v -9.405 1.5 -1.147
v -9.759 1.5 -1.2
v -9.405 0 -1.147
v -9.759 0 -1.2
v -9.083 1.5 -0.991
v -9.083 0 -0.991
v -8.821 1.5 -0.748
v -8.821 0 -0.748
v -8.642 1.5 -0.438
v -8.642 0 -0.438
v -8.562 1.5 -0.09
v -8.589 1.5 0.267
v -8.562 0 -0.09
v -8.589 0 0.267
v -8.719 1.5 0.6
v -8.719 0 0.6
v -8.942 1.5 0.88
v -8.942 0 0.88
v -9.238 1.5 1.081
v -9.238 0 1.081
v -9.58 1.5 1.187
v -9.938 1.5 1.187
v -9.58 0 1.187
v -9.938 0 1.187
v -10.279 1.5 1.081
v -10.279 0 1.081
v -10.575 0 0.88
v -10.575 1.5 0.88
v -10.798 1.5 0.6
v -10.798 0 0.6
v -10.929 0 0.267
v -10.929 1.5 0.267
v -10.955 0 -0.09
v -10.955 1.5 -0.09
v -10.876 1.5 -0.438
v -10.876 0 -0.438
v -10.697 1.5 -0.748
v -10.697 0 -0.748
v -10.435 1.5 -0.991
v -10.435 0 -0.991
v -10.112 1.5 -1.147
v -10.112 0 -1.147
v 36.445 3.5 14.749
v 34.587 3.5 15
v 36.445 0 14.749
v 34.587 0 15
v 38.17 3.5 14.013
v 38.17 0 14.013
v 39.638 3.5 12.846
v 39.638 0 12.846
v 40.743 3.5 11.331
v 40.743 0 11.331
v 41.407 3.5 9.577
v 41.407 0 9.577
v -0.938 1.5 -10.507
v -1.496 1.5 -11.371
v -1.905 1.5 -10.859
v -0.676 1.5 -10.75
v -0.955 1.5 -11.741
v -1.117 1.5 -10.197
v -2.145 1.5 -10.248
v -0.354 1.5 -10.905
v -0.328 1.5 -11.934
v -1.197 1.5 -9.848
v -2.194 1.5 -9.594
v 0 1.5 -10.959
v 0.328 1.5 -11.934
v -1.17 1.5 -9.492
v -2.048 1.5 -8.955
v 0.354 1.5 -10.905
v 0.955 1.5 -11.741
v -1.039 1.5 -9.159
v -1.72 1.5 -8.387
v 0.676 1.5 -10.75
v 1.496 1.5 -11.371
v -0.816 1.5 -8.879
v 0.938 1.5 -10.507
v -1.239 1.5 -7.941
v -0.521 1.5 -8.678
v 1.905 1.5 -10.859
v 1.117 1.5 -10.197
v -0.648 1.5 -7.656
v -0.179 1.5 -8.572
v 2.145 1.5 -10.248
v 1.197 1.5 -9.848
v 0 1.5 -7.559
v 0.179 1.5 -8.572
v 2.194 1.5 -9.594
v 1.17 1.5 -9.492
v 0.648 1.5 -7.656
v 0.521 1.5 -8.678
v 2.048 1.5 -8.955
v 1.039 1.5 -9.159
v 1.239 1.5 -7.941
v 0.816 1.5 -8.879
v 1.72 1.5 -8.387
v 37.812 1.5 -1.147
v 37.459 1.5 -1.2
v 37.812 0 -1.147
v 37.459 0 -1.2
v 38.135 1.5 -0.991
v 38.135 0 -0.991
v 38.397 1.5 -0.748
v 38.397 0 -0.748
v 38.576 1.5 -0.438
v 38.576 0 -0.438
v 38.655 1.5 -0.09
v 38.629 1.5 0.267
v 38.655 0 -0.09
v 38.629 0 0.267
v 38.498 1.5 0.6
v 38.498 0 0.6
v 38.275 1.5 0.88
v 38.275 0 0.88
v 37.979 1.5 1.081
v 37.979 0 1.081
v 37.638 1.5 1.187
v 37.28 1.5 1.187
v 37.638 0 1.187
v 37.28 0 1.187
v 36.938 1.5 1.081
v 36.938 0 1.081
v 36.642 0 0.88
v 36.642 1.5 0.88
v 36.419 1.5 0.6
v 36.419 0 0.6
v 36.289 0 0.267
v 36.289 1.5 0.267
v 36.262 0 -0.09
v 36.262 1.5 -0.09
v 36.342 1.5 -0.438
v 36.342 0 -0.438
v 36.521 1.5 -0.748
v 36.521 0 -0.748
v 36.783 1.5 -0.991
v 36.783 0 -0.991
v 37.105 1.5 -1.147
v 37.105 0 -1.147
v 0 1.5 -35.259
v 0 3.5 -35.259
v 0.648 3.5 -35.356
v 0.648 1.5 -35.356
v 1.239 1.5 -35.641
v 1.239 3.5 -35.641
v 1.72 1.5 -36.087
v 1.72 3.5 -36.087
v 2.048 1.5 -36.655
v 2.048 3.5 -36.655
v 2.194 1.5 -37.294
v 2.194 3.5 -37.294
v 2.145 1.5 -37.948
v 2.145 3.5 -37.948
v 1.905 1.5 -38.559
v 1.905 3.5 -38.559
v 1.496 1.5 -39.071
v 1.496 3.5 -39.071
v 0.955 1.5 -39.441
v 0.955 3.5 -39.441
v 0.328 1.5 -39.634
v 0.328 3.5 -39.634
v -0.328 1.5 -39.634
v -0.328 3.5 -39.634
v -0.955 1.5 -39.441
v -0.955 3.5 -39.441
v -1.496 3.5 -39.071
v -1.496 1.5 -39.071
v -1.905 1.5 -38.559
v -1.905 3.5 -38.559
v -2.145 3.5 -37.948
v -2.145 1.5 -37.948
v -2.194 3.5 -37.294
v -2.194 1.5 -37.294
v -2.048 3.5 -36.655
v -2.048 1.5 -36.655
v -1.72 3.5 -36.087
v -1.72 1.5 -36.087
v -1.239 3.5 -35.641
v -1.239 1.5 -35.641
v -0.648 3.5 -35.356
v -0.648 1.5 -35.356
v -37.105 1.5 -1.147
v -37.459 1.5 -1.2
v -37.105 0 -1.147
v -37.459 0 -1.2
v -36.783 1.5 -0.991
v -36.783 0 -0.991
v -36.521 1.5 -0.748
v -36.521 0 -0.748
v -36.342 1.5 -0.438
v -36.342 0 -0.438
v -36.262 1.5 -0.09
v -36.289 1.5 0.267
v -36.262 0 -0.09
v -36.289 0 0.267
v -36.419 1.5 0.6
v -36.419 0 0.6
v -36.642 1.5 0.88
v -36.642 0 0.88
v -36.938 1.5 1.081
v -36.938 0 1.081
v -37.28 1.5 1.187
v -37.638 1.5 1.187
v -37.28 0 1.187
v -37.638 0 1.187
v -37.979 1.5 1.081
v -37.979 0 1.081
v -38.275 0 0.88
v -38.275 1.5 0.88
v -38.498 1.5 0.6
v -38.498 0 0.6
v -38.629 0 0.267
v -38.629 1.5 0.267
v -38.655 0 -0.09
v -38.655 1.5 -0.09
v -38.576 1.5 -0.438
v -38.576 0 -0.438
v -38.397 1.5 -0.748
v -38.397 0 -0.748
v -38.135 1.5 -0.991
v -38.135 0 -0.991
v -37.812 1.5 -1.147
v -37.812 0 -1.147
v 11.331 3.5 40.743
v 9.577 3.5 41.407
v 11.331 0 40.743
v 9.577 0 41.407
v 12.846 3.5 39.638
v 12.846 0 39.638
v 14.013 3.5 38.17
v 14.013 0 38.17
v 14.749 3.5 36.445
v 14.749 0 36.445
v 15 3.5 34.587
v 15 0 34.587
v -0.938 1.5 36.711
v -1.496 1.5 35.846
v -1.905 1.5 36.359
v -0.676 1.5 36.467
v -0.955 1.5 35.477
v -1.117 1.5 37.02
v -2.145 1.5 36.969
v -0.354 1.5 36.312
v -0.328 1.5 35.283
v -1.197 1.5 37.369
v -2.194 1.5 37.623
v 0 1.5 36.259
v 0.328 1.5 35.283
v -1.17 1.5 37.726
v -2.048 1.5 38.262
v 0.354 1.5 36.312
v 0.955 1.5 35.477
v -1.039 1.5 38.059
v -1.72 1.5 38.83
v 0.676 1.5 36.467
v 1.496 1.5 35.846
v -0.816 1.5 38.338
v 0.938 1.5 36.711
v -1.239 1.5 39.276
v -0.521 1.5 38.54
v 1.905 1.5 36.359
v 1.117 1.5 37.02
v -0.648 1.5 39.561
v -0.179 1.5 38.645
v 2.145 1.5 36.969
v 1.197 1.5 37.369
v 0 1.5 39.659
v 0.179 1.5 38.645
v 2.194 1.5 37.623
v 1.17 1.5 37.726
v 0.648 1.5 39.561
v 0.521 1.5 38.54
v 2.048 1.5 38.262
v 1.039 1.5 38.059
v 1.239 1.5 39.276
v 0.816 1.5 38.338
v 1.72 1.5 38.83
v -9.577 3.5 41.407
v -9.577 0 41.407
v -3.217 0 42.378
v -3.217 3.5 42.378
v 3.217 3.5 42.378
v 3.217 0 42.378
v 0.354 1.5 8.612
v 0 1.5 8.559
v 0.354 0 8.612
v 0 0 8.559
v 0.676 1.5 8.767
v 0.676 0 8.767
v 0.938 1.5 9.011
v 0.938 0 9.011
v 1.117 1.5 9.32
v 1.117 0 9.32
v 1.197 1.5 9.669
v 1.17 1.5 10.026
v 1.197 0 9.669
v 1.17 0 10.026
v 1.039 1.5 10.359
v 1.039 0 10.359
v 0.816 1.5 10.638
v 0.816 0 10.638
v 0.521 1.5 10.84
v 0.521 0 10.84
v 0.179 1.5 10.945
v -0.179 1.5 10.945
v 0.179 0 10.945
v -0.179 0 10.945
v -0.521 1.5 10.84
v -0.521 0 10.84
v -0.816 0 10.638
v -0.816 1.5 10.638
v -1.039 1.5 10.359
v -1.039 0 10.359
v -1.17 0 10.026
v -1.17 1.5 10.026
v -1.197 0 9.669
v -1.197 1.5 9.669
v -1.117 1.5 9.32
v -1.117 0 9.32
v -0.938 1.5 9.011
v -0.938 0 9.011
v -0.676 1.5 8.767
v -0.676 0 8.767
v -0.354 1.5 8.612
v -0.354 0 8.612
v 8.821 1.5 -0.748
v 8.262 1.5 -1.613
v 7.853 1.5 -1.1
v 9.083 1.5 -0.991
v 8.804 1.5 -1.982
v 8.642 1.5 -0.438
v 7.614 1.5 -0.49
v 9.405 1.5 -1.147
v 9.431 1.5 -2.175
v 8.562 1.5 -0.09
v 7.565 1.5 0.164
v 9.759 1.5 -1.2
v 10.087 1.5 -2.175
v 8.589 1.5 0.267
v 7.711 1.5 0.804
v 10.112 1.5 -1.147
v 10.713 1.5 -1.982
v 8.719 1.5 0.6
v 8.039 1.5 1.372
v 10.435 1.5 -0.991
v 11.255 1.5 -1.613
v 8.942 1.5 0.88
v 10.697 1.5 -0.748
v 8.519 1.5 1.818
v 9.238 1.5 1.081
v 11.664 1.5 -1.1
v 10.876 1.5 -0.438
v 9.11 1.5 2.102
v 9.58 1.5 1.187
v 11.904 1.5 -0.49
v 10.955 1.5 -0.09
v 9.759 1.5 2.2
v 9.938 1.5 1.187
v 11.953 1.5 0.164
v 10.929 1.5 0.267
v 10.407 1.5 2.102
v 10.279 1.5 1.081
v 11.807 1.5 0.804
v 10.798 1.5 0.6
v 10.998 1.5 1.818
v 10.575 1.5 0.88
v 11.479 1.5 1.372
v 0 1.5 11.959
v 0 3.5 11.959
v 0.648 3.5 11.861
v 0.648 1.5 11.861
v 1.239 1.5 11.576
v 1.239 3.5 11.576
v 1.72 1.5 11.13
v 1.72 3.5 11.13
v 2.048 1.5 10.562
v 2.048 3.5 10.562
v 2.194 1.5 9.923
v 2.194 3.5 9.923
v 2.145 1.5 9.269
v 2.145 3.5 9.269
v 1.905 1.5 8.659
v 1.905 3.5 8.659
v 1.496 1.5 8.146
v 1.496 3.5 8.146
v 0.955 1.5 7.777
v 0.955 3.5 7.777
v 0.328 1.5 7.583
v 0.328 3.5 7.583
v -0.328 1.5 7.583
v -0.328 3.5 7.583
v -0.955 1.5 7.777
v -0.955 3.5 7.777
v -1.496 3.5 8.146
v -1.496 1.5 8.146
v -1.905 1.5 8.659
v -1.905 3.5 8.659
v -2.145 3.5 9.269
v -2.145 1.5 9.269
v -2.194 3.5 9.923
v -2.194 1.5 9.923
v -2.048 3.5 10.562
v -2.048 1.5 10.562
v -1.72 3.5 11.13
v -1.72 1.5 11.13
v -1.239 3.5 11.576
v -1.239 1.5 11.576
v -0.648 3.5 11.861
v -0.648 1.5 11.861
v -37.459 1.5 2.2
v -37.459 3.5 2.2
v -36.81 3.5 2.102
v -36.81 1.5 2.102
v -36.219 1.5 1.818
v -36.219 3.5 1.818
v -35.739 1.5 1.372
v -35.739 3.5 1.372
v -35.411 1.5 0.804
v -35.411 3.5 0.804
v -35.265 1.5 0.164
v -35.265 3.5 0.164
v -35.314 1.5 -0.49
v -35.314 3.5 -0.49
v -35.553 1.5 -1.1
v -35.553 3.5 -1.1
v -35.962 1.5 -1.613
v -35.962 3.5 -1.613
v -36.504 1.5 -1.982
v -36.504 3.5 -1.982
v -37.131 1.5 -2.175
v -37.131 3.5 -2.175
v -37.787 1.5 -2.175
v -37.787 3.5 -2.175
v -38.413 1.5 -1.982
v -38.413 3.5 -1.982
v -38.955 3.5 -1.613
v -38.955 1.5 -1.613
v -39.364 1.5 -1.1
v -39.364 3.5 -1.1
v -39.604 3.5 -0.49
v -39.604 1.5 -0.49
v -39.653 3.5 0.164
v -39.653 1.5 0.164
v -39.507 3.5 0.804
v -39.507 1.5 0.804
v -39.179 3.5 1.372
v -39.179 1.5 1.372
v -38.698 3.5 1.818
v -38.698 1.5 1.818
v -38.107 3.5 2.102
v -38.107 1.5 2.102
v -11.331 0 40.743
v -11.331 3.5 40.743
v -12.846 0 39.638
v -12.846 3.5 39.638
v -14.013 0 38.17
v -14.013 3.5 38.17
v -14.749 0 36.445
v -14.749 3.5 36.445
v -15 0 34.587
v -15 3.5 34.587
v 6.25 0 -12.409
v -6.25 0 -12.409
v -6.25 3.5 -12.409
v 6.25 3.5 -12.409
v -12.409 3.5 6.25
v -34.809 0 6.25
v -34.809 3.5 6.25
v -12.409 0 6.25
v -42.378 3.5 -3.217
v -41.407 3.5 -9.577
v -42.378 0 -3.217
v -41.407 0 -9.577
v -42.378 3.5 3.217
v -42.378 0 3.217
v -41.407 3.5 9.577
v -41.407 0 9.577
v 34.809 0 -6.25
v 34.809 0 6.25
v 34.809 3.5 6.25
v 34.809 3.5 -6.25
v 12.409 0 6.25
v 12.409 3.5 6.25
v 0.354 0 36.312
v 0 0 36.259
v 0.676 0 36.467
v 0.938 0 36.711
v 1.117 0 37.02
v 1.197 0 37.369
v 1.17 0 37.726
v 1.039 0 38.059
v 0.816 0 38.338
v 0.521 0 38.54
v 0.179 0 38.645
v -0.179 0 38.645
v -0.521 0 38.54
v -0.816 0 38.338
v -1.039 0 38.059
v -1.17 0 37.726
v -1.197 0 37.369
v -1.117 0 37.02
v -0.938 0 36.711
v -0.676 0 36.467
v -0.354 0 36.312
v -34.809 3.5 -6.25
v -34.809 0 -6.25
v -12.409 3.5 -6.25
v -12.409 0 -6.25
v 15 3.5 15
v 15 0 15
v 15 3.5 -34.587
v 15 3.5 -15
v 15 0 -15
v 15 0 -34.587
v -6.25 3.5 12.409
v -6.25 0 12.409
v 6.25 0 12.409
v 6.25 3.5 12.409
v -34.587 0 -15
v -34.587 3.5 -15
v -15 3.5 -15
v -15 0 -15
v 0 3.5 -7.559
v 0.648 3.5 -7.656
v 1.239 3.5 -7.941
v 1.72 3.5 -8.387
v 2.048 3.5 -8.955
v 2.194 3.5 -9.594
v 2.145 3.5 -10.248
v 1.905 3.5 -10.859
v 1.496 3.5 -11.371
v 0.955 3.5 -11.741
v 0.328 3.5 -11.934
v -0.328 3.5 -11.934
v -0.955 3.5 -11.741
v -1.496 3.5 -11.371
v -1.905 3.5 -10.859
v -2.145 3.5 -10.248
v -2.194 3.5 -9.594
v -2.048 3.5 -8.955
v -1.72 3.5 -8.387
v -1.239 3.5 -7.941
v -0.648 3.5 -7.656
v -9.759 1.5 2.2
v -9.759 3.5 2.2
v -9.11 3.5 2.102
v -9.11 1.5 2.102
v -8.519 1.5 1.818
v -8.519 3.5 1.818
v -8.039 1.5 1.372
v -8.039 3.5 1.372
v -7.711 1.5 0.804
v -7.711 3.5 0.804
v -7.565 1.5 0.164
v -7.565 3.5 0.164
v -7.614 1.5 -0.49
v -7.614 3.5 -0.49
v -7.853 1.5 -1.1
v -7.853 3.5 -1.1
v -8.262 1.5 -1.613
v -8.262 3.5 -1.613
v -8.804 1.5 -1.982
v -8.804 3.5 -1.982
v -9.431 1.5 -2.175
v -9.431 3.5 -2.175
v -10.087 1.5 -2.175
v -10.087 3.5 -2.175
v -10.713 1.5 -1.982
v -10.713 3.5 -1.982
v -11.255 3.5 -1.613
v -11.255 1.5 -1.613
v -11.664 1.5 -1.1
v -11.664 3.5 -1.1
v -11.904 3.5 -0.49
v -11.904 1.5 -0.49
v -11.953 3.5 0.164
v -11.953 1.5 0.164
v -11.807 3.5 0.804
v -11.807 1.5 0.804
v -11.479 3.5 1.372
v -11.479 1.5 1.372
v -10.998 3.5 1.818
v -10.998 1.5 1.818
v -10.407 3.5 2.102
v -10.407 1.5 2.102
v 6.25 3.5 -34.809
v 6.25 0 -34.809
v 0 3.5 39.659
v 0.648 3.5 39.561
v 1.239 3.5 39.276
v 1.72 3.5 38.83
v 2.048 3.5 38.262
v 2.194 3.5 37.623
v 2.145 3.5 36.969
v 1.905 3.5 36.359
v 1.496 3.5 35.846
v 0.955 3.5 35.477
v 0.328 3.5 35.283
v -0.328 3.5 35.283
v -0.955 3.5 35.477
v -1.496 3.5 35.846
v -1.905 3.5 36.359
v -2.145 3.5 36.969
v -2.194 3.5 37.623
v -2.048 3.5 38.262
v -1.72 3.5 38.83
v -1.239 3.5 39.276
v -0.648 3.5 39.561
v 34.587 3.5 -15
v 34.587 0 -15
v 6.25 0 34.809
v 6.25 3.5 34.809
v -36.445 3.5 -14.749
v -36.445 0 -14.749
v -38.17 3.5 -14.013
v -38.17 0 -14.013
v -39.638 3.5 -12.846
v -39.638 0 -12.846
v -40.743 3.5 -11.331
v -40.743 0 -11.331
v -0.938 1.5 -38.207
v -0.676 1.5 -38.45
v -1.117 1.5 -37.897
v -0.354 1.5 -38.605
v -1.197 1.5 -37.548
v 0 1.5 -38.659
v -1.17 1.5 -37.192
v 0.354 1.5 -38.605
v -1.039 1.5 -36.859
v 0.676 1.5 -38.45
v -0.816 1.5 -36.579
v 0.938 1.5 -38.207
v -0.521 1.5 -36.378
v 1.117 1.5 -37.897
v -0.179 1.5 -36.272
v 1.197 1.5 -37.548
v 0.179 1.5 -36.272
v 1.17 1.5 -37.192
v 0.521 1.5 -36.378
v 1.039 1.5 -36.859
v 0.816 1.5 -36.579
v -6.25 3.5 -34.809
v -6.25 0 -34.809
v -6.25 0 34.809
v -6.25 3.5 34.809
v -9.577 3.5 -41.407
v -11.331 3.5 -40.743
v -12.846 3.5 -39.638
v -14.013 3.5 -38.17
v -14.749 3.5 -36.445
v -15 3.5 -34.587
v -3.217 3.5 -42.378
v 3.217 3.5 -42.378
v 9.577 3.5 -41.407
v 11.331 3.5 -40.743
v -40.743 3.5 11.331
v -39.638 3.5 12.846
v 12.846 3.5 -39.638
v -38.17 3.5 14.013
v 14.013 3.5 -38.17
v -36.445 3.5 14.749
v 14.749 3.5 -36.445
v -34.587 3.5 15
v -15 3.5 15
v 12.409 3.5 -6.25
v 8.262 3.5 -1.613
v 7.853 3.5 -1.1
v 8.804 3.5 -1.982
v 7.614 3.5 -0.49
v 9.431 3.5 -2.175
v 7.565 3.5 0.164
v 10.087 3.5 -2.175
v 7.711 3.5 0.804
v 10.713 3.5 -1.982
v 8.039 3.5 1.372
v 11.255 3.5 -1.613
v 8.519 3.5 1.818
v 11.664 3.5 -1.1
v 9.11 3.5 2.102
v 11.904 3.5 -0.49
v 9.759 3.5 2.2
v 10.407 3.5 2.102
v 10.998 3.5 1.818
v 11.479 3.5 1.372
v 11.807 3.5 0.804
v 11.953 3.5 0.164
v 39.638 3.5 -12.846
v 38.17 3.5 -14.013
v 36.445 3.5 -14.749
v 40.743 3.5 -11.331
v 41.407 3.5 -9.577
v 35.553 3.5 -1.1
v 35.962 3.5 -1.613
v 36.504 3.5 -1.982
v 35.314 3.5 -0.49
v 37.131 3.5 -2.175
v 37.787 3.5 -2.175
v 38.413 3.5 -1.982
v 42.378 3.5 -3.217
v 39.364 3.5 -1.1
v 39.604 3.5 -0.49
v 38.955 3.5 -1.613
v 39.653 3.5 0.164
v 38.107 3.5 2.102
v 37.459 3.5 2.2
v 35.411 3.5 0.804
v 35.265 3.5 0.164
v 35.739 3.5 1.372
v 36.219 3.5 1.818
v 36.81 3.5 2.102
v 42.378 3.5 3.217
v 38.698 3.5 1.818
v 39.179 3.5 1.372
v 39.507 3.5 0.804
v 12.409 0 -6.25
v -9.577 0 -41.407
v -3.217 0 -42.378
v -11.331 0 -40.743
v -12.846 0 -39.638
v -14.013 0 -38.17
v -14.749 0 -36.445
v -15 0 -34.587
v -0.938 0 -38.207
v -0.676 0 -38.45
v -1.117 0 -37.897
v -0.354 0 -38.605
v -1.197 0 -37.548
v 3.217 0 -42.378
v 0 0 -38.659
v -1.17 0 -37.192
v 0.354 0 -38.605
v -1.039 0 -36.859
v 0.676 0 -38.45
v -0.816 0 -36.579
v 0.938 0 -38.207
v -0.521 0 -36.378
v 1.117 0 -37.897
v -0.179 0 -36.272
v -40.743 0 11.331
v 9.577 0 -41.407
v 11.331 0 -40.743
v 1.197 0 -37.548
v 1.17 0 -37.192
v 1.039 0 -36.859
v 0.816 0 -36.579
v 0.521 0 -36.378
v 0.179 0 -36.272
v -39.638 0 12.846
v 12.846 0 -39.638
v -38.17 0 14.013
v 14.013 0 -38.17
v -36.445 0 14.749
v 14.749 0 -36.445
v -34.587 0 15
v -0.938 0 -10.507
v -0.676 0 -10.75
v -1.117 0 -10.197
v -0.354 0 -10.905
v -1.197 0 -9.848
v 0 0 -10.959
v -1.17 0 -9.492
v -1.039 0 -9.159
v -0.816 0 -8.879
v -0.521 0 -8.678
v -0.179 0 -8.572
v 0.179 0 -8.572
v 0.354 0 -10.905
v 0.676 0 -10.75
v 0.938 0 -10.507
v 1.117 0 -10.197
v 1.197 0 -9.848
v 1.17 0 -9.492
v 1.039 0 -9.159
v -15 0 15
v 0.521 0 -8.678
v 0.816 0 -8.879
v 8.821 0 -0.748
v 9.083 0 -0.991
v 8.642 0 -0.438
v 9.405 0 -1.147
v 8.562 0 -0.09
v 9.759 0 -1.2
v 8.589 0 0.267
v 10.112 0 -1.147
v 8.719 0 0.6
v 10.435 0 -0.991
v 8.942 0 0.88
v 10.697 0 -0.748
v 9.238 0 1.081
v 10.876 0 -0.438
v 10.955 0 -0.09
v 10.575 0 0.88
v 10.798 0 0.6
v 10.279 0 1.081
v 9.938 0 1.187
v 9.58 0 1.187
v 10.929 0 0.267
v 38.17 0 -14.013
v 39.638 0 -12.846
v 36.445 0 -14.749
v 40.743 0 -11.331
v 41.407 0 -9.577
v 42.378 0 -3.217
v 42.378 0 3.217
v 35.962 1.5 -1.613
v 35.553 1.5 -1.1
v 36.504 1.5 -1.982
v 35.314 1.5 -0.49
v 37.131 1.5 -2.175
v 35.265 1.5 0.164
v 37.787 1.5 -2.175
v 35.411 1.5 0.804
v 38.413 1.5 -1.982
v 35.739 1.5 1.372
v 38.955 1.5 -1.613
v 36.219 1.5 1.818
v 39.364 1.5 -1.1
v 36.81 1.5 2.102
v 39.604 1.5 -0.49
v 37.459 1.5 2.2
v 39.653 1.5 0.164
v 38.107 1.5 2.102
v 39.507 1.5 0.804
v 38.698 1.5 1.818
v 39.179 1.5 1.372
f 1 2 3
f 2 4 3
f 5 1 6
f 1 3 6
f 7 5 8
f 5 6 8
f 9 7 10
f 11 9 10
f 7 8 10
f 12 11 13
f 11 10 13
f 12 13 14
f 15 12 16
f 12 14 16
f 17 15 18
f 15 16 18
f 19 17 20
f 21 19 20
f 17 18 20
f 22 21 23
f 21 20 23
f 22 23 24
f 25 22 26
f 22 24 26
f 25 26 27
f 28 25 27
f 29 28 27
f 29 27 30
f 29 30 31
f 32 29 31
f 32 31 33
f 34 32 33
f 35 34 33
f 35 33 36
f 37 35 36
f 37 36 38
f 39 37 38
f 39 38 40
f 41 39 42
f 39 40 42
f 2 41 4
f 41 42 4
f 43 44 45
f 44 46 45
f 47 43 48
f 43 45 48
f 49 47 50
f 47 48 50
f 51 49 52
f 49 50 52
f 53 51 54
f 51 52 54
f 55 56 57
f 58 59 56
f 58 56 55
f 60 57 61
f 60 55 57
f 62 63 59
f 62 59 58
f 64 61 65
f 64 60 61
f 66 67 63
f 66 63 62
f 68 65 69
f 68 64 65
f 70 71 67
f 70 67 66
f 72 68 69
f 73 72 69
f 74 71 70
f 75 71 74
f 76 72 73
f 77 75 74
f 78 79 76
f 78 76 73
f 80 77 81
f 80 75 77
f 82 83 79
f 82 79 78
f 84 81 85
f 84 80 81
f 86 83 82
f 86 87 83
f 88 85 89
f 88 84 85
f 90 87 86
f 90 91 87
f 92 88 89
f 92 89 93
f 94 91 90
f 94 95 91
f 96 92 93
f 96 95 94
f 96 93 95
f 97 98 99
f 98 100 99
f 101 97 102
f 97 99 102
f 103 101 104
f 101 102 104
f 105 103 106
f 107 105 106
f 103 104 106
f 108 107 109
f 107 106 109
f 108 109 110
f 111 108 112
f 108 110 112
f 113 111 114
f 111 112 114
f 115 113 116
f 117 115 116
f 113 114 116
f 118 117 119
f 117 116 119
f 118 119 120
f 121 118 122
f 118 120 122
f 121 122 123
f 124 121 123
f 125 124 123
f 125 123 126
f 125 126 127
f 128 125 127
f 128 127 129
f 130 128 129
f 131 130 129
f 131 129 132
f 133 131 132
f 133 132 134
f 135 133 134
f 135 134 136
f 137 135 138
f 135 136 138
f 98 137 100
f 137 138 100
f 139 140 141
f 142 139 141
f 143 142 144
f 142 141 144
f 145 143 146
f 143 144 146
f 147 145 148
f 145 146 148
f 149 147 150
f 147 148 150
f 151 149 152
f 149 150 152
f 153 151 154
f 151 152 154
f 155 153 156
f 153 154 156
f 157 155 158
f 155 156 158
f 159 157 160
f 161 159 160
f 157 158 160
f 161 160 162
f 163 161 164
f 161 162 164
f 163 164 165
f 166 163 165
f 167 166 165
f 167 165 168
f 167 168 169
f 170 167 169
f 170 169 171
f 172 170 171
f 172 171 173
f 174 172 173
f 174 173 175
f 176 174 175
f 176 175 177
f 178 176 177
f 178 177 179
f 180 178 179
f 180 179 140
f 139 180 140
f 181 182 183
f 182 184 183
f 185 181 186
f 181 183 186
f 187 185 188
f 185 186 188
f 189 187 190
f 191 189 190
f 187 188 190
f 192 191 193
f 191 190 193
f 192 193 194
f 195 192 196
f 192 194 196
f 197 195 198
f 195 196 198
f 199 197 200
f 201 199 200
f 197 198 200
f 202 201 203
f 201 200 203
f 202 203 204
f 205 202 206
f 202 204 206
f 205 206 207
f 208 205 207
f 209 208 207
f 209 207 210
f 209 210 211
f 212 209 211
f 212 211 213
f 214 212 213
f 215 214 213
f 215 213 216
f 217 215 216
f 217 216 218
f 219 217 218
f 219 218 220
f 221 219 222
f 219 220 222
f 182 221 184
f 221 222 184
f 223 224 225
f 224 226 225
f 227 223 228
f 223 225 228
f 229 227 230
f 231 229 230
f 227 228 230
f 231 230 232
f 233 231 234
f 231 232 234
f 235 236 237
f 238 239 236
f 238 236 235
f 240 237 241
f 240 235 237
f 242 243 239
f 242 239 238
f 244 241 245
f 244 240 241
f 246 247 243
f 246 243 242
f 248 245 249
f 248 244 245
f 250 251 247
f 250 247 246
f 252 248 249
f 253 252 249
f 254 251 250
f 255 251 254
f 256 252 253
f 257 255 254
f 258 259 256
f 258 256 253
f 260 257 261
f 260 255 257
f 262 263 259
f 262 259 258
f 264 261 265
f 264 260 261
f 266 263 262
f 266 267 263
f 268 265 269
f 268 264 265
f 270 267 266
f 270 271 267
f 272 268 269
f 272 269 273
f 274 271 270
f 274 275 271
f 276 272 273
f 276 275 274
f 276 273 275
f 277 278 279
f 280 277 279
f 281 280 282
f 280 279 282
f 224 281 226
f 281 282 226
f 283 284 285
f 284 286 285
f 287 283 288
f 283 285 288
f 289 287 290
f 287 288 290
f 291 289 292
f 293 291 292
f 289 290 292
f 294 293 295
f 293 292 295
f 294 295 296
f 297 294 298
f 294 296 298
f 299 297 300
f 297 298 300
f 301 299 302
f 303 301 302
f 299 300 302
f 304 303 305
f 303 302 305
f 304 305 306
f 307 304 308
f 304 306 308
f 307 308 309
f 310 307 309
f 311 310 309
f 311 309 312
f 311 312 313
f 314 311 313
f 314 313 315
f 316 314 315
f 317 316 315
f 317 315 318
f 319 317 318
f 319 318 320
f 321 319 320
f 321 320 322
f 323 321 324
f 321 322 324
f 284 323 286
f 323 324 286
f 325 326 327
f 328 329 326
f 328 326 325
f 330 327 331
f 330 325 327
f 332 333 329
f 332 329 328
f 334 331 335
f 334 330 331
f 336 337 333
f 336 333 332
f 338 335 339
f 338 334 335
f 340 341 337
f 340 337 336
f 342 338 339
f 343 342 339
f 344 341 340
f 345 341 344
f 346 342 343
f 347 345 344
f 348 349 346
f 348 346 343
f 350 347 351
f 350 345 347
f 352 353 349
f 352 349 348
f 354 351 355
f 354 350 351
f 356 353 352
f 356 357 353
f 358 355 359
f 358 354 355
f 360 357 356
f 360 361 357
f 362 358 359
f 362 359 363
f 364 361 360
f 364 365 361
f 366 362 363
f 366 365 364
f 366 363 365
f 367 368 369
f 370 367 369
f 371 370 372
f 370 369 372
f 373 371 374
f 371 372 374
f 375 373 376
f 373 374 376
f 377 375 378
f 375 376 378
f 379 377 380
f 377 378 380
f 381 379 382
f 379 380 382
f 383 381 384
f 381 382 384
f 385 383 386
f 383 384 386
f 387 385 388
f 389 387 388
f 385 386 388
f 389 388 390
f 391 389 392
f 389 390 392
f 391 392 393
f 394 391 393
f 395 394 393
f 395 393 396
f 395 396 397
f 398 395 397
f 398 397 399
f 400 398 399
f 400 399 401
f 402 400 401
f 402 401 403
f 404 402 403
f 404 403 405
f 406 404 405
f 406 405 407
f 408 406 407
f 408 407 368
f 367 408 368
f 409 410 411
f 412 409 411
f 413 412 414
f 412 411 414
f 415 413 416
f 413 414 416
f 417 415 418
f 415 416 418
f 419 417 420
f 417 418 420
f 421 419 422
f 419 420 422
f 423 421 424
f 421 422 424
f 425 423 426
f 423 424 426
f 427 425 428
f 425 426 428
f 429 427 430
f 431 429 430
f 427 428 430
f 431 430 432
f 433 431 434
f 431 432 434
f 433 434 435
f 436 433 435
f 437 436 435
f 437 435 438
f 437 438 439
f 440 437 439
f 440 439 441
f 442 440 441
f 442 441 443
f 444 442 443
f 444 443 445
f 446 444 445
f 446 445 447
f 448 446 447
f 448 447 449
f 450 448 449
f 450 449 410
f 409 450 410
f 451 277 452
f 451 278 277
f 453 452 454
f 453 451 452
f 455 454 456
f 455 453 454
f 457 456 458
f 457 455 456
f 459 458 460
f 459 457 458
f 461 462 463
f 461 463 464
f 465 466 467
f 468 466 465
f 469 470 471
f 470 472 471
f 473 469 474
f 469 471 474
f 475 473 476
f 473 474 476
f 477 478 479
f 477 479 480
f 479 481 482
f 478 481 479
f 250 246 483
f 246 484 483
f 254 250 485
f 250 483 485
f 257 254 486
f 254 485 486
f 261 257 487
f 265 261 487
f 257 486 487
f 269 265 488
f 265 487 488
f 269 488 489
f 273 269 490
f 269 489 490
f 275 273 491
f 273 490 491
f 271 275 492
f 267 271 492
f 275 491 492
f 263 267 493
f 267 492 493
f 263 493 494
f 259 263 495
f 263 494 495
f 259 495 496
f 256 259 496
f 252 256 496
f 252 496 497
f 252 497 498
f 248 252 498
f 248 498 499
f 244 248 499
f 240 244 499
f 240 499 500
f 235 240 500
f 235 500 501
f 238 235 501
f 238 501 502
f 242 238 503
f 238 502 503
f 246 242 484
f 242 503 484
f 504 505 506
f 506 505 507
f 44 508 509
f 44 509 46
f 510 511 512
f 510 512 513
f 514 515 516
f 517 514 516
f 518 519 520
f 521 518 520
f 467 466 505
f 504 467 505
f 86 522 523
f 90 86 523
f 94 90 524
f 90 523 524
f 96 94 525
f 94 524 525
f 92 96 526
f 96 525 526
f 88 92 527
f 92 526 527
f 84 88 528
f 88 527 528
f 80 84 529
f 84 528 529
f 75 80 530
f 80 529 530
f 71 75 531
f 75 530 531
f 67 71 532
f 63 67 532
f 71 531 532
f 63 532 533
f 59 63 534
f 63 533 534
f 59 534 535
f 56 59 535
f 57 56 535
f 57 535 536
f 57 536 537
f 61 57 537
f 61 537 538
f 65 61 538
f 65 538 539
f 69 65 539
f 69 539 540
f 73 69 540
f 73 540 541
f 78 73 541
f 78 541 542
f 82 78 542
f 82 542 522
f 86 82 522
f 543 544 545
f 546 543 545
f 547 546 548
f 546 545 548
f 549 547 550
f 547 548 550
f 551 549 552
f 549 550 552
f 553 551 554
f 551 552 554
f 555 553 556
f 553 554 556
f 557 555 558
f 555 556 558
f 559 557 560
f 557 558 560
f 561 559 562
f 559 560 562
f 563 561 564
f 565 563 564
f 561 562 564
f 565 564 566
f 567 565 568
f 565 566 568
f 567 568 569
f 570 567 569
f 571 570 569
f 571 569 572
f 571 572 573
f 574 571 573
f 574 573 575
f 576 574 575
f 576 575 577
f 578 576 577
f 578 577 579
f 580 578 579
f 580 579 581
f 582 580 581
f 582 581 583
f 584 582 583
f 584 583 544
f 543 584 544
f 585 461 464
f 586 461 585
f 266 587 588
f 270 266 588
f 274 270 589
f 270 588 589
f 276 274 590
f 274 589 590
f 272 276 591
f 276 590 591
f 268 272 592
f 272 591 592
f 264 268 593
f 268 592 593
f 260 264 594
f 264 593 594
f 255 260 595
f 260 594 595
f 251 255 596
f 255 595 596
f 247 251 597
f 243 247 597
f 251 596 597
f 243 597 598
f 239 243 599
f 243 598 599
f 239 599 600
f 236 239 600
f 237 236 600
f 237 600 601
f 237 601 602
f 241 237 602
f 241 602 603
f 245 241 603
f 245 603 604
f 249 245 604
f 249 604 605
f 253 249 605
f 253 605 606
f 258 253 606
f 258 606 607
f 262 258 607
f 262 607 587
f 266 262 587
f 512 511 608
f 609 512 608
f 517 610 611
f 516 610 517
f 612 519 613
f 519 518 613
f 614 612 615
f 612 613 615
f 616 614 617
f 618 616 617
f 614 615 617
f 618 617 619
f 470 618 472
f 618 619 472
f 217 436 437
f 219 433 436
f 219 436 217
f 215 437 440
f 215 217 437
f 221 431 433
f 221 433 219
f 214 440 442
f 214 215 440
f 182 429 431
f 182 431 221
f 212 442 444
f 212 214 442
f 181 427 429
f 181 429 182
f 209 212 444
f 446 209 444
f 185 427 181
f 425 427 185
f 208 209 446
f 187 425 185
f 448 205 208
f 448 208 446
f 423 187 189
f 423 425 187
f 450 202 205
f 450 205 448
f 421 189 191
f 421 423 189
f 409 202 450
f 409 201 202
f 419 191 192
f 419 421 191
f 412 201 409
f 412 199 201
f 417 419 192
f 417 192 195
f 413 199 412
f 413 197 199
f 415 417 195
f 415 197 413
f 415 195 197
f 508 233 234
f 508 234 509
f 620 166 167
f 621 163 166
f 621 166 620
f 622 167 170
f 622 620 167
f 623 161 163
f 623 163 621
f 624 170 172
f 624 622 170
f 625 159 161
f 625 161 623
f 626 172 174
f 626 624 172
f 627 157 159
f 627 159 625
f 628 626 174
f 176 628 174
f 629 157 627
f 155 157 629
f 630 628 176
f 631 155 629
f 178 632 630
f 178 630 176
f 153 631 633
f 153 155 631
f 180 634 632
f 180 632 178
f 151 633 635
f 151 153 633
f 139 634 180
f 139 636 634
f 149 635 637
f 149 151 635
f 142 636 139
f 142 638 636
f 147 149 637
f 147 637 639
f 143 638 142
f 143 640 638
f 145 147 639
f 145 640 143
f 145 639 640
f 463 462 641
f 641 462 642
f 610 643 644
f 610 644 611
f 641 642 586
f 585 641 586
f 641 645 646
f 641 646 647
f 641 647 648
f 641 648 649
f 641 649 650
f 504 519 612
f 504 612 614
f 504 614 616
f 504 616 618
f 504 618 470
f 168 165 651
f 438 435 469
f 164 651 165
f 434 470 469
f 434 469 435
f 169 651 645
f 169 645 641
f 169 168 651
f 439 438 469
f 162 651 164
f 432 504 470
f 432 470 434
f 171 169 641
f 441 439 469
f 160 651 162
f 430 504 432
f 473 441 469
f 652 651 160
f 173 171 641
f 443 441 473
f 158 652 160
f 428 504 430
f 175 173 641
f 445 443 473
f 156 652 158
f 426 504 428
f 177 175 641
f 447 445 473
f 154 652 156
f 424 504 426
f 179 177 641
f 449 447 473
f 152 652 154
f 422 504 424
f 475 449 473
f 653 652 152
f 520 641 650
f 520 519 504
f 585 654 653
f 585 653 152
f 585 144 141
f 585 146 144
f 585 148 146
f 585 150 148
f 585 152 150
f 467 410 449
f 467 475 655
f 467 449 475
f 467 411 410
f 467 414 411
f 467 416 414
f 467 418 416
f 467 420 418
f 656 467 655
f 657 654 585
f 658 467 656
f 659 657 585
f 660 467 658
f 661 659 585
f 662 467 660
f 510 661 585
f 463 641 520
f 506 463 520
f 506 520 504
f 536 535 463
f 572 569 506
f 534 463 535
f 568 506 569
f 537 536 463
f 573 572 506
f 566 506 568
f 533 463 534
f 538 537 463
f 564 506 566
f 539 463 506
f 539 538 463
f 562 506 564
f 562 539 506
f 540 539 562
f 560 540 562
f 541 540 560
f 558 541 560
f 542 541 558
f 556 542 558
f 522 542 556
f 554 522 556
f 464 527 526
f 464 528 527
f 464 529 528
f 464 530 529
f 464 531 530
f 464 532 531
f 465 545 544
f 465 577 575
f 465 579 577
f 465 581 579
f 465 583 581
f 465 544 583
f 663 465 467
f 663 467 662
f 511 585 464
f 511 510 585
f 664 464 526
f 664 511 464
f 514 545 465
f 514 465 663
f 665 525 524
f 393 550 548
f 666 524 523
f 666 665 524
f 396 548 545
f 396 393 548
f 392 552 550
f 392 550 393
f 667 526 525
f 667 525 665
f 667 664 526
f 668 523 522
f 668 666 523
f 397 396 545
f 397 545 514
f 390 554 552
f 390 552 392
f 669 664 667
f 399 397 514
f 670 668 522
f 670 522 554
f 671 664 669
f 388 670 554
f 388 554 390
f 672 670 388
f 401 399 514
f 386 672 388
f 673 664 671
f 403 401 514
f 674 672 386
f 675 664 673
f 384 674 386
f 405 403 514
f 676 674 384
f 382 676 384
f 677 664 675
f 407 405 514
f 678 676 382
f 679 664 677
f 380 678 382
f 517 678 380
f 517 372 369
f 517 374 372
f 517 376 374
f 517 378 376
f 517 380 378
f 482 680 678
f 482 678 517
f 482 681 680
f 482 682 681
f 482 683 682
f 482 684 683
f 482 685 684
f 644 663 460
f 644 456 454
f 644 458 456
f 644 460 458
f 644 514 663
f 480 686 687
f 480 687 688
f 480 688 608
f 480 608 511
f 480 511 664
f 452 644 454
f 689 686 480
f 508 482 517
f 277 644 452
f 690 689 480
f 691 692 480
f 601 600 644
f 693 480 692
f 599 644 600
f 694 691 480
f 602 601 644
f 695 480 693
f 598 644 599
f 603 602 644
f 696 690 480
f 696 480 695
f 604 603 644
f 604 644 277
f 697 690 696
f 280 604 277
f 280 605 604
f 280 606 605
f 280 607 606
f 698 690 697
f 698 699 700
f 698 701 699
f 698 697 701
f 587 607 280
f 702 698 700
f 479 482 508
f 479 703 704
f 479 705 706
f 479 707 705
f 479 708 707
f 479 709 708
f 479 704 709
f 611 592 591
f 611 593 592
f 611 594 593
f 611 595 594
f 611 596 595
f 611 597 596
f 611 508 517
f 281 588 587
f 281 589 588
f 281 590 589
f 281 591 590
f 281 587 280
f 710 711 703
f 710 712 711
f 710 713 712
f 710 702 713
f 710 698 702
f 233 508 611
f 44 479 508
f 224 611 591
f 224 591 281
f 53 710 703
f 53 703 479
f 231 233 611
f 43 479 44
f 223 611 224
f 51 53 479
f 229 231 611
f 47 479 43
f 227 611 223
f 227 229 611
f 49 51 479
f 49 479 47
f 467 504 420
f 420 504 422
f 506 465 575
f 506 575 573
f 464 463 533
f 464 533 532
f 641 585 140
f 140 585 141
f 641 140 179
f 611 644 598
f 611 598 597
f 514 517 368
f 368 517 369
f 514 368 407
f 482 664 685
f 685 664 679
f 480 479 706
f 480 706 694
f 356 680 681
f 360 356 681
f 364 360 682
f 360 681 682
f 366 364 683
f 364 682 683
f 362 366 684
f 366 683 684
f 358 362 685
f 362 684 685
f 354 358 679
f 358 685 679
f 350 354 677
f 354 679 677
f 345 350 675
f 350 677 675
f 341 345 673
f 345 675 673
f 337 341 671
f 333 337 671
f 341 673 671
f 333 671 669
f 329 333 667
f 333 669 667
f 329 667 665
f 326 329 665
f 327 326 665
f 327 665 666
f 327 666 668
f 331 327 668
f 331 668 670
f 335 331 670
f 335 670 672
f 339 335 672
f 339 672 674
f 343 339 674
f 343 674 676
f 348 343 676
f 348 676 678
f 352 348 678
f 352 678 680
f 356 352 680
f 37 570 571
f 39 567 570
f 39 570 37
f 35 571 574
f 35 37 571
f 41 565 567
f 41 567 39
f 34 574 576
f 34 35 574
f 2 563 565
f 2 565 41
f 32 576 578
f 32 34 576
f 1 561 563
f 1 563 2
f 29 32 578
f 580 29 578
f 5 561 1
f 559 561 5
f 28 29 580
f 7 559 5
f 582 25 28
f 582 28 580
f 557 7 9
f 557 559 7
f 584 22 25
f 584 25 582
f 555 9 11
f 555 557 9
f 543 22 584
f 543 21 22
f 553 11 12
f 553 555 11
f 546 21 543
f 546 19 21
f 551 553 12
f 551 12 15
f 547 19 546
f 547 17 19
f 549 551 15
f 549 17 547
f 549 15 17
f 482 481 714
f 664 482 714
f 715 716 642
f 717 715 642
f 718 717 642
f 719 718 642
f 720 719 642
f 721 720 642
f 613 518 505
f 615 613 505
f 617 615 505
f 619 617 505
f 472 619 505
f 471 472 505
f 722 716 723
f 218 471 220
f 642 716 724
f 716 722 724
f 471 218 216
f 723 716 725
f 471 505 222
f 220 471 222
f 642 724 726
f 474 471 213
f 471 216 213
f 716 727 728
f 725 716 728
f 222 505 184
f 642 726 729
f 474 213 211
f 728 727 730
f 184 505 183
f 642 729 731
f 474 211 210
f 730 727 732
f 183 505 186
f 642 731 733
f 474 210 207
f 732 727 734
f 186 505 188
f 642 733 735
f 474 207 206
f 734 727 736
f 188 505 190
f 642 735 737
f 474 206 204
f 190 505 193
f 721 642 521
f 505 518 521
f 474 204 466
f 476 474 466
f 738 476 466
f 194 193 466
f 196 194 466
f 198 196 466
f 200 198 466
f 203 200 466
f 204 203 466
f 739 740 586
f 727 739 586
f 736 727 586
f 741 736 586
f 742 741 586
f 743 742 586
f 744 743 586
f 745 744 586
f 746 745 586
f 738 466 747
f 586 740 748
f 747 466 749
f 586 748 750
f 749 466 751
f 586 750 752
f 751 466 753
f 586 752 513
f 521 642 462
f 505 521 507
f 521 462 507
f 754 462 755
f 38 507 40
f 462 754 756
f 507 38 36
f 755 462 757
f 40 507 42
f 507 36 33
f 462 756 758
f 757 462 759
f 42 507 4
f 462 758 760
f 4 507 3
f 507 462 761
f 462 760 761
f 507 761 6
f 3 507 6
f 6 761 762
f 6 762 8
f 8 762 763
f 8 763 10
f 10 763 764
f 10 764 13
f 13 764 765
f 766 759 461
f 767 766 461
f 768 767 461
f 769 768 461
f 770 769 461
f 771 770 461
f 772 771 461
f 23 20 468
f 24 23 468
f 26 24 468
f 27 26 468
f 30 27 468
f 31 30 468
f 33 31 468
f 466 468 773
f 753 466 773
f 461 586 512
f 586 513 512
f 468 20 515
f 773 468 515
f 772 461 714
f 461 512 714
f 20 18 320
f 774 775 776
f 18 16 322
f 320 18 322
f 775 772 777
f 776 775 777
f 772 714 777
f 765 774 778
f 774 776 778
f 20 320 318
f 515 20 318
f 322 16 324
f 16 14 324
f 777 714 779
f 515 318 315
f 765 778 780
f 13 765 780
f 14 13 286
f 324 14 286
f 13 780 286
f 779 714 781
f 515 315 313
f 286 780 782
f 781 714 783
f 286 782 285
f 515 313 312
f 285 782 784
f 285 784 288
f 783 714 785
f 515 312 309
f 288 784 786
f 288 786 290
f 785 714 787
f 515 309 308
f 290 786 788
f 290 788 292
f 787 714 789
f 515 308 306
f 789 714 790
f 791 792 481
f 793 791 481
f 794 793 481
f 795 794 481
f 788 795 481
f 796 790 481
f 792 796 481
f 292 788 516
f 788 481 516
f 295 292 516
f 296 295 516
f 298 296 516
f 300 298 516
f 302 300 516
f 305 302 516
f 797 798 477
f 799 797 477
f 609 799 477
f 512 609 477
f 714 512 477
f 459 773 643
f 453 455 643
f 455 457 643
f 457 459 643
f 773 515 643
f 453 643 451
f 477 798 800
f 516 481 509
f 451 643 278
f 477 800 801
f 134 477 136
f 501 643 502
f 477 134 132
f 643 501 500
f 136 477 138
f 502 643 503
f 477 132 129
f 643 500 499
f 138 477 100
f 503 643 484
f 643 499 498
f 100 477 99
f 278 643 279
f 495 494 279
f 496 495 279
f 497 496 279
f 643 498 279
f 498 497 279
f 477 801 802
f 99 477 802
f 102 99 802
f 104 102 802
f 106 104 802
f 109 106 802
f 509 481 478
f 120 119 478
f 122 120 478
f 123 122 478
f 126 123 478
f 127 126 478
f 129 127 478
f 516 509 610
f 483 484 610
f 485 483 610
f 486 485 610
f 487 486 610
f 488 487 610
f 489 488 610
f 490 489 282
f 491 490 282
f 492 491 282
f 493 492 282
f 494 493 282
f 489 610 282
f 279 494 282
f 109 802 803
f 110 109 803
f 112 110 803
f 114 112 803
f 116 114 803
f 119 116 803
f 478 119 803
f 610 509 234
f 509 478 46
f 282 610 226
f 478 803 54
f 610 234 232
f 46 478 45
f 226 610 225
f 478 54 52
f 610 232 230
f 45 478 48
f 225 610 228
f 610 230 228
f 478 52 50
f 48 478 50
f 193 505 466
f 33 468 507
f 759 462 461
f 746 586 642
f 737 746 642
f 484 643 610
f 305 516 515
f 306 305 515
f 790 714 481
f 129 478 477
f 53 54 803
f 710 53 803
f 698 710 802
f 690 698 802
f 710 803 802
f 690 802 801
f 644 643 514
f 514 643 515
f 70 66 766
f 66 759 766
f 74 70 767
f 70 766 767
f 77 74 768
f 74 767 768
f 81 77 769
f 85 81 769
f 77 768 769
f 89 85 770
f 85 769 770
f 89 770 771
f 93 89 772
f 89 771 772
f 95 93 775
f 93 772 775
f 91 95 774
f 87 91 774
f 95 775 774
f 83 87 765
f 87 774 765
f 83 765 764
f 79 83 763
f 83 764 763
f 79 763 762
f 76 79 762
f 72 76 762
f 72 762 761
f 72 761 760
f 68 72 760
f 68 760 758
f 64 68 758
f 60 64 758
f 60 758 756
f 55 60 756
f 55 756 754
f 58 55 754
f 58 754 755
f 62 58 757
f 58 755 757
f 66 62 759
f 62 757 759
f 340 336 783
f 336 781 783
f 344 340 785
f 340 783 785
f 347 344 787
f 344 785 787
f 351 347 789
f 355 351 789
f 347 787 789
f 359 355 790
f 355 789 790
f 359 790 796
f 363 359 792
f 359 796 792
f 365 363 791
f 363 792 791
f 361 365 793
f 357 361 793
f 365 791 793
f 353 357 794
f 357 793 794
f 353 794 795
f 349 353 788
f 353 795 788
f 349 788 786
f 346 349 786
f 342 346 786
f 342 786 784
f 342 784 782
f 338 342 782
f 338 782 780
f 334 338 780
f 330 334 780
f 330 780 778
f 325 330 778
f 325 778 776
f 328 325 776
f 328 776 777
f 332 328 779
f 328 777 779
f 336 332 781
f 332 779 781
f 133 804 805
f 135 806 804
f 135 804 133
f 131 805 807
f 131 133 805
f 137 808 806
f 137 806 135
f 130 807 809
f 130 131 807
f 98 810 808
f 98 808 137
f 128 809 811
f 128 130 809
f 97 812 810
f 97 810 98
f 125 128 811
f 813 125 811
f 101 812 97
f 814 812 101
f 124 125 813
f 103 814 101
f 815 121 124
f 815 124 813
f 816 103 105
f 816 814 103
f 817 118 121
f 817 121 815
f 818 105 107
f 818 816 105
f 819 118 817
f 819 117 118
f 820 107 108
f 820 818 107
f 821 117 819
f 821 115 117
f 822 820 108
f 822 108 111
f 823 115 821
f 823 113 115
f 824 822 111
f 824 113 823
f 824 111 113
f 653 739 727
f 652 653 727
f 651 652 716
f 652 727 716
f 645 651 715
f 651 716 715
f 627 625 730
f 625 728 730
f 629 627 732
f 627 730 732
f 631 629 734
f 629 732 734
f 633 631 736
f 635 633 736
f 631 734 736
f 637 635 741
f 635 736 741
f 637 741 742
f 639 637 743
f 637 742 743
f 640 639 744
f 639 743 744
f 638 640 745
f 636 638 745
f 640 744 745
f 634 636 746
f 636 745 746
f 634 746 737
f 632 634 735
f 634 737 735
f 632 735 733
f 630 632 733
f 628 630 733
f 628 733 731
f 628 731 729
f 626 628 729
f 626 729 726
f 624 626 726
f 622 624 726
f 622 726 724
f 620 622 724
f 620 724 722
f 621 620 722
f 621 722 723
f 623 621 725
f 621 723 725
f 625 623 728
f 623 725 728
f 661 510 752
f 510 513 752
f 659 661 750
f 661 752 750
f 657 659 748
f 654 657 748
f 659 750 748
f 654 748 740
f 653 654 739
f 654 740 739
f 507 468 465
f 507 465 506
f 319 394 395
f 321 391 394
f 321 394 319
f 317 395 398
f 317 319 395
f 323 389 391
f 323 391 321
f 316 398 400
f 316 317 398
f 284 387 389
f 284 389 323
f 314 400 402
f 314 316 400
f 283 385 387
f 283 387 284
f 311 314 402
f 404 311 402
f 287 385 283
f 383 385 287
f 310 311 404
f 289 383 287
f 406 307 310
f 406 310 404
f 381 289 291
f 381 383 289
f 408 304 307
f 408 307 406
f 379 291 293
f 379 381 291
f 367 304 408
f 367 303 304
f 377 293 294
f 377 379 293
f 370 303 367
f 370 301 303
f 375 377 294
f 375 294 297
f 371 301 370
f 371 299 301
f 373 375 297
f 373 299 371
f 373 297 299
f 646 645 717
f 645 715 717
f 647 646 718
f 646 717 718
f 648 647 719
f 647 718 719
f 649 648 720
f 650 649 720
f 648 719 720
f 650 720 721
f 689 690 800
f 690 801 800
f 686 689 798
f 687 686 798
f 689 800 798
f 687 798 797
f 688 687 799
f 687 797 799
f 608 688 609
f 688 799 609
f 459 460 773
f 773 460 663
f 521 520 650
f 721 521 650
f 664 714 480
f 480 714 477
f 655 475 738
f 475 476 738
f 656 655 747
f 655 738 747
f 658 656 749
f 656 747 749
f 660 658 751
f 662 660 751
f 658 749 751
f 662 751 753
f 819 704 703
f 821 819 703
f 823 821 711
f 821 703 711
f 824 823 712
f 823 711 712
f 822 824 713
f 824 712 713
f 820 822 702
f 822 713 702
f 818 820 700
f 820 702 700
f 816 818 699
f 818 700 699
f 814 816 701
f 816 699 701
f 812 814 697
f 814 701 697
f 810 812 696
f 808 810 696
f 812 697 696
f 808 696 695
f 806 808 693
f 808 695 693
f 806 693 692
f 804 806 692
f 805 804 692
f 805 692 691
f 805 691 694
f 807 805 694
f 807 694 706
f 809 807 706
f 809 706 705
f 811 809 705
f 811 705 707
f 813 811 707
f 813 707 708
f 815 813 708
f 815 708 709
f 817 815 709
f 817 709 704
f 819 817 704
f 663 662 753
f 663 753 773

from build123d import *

# Parameters (mm, degrees)
SKETCH_1_R                   = 42.5
SKETCH_1_W                   = 12.5
SKETCH_1_H                   = 22.4
SKETCH_1_W_2                 = 22.4
SKETCH_1_H_2                 = 12.5
EXTRUDE_1_DEPTH              = 3.5
HOLE_WIZARD_M2_1_D           = 2.4
HOLE_WIZARD_M2_1_CBORE_D     = 4.4
HOLE_WIZARD_M2_1_CBORE_DEPTH = 2
SKETCH_5_W                   = 28.893914533
SKETCH_5_H                   = 29.378378832
SKETCH_5_W_2                 = 29.378378832
SKETCH_5_H_2                 = 28.893914533
CUT_EXTRUDE_1_DEPTH          = 10
FILLET_1_R                   = 7


with BuildPart() as part:
    # 草图1 → 凸台-拉伸1 (new body)
    with BuildSketch(Plane(origin=(0, 0, 0), x_dir=(1, 0, 0), z_dir=(0, 1, 0))):
        with Locations(Location((0, 0, 0), (0, 0, 270))):
            Circle(SKETCH_1_R)
        with Locations((0, 23.608701573)):
            Rectangle(SKETCH_1_W, SKETCH_1_H, mode=Mode.SUBTRACT)
        with Locations((-23.608701573, 0)):
            Rectangle(SKETCH_1_W_2, SKETCH_1_H_2, mode=Mode.SUBTRACT)
        with Locations((23.608701573, 0)):
            Rectangle(SKETCH_1_W_2, SKETCH_1_H_2, mode=Mode.SUBTRACT)
        with Locations((0, -23.608701573)):
            Rectangle(SKETCH_1_W, SKETCH_1_H, mode=Mode.SUBTRACT)
    extrude(amount=EXTRUDE_1_DEPTH)

    # M2 凹头盖螺钉的柱形沉头孔1 (through all)
    with Locations(Plane(origin=(-9.758701573, 3.5, 0), x_dir=(0, 0, 1), z_dir=(0, 1, 0))):
        with Locations((0, 0), (-9.758701573, 9.758701573), (0, 19.517403146), (9.758701573, 9.758701573), (0, 47.217403146), (-37.458701573, 9.758701573), (0, -27.7), (37.458701573, 9.758701573)):
            CounterBoreHole(HOLE_WIZARD_M2_1_D / 2, HOLE_WIZARD_M2_1_CBORE_D / 2, HOLE_WIZARD_M2_1_CBORE_DEPTH)

    # 草图5 → 切除-拉伸1 (cut)
    with BuildSketch(Plane(origin=(0, 3.5, 0), x_dir=(1, 0, 0), z_dir=(0, 1, 0))):
        with Locations((29.446957267, 29.689189416)):
            Rectangle(SKETCH_5_W, SKETCH_5_H)
        with Locations((-29.689189416, 29.446957267)):
            Rectangle(SKETCH_5_W_2, SKETCH_5_H_2)
        with Locations((29.689189416, -29.446957267)):
            Rectangle(SKETCH_5_W_2, SKETCH_5_H_2)
        with Locations((-29.446957267, -29.689189416)):
            Rectangle(SKETCH_5_W, SKETCH_5_H)
    extrude(amount=-CUT_EXTRUDE_1_DEPTH, mode=Mode.SUBTRACT)

    # 圆角1
    fillet_1_edges = [part.edges().sort_by_distance(p)[0] for p in [
        (-39.764934301, 1.75, -15),
        (-15, 1.75, -39.764934301),
        (-39.764934301, 1.75, 15),
        (-15, 1.75, 39.764934301),
        (15, 1.75, 39.764934301),
        (39.764934301, 1.75, 15),
        (39.764934301, 1.75, -15),
        (15, 1.75, -39.764934301),
    ]]
    fillet(fillet_1_edges, radius=FILLET_1_R)


solid = part.part
